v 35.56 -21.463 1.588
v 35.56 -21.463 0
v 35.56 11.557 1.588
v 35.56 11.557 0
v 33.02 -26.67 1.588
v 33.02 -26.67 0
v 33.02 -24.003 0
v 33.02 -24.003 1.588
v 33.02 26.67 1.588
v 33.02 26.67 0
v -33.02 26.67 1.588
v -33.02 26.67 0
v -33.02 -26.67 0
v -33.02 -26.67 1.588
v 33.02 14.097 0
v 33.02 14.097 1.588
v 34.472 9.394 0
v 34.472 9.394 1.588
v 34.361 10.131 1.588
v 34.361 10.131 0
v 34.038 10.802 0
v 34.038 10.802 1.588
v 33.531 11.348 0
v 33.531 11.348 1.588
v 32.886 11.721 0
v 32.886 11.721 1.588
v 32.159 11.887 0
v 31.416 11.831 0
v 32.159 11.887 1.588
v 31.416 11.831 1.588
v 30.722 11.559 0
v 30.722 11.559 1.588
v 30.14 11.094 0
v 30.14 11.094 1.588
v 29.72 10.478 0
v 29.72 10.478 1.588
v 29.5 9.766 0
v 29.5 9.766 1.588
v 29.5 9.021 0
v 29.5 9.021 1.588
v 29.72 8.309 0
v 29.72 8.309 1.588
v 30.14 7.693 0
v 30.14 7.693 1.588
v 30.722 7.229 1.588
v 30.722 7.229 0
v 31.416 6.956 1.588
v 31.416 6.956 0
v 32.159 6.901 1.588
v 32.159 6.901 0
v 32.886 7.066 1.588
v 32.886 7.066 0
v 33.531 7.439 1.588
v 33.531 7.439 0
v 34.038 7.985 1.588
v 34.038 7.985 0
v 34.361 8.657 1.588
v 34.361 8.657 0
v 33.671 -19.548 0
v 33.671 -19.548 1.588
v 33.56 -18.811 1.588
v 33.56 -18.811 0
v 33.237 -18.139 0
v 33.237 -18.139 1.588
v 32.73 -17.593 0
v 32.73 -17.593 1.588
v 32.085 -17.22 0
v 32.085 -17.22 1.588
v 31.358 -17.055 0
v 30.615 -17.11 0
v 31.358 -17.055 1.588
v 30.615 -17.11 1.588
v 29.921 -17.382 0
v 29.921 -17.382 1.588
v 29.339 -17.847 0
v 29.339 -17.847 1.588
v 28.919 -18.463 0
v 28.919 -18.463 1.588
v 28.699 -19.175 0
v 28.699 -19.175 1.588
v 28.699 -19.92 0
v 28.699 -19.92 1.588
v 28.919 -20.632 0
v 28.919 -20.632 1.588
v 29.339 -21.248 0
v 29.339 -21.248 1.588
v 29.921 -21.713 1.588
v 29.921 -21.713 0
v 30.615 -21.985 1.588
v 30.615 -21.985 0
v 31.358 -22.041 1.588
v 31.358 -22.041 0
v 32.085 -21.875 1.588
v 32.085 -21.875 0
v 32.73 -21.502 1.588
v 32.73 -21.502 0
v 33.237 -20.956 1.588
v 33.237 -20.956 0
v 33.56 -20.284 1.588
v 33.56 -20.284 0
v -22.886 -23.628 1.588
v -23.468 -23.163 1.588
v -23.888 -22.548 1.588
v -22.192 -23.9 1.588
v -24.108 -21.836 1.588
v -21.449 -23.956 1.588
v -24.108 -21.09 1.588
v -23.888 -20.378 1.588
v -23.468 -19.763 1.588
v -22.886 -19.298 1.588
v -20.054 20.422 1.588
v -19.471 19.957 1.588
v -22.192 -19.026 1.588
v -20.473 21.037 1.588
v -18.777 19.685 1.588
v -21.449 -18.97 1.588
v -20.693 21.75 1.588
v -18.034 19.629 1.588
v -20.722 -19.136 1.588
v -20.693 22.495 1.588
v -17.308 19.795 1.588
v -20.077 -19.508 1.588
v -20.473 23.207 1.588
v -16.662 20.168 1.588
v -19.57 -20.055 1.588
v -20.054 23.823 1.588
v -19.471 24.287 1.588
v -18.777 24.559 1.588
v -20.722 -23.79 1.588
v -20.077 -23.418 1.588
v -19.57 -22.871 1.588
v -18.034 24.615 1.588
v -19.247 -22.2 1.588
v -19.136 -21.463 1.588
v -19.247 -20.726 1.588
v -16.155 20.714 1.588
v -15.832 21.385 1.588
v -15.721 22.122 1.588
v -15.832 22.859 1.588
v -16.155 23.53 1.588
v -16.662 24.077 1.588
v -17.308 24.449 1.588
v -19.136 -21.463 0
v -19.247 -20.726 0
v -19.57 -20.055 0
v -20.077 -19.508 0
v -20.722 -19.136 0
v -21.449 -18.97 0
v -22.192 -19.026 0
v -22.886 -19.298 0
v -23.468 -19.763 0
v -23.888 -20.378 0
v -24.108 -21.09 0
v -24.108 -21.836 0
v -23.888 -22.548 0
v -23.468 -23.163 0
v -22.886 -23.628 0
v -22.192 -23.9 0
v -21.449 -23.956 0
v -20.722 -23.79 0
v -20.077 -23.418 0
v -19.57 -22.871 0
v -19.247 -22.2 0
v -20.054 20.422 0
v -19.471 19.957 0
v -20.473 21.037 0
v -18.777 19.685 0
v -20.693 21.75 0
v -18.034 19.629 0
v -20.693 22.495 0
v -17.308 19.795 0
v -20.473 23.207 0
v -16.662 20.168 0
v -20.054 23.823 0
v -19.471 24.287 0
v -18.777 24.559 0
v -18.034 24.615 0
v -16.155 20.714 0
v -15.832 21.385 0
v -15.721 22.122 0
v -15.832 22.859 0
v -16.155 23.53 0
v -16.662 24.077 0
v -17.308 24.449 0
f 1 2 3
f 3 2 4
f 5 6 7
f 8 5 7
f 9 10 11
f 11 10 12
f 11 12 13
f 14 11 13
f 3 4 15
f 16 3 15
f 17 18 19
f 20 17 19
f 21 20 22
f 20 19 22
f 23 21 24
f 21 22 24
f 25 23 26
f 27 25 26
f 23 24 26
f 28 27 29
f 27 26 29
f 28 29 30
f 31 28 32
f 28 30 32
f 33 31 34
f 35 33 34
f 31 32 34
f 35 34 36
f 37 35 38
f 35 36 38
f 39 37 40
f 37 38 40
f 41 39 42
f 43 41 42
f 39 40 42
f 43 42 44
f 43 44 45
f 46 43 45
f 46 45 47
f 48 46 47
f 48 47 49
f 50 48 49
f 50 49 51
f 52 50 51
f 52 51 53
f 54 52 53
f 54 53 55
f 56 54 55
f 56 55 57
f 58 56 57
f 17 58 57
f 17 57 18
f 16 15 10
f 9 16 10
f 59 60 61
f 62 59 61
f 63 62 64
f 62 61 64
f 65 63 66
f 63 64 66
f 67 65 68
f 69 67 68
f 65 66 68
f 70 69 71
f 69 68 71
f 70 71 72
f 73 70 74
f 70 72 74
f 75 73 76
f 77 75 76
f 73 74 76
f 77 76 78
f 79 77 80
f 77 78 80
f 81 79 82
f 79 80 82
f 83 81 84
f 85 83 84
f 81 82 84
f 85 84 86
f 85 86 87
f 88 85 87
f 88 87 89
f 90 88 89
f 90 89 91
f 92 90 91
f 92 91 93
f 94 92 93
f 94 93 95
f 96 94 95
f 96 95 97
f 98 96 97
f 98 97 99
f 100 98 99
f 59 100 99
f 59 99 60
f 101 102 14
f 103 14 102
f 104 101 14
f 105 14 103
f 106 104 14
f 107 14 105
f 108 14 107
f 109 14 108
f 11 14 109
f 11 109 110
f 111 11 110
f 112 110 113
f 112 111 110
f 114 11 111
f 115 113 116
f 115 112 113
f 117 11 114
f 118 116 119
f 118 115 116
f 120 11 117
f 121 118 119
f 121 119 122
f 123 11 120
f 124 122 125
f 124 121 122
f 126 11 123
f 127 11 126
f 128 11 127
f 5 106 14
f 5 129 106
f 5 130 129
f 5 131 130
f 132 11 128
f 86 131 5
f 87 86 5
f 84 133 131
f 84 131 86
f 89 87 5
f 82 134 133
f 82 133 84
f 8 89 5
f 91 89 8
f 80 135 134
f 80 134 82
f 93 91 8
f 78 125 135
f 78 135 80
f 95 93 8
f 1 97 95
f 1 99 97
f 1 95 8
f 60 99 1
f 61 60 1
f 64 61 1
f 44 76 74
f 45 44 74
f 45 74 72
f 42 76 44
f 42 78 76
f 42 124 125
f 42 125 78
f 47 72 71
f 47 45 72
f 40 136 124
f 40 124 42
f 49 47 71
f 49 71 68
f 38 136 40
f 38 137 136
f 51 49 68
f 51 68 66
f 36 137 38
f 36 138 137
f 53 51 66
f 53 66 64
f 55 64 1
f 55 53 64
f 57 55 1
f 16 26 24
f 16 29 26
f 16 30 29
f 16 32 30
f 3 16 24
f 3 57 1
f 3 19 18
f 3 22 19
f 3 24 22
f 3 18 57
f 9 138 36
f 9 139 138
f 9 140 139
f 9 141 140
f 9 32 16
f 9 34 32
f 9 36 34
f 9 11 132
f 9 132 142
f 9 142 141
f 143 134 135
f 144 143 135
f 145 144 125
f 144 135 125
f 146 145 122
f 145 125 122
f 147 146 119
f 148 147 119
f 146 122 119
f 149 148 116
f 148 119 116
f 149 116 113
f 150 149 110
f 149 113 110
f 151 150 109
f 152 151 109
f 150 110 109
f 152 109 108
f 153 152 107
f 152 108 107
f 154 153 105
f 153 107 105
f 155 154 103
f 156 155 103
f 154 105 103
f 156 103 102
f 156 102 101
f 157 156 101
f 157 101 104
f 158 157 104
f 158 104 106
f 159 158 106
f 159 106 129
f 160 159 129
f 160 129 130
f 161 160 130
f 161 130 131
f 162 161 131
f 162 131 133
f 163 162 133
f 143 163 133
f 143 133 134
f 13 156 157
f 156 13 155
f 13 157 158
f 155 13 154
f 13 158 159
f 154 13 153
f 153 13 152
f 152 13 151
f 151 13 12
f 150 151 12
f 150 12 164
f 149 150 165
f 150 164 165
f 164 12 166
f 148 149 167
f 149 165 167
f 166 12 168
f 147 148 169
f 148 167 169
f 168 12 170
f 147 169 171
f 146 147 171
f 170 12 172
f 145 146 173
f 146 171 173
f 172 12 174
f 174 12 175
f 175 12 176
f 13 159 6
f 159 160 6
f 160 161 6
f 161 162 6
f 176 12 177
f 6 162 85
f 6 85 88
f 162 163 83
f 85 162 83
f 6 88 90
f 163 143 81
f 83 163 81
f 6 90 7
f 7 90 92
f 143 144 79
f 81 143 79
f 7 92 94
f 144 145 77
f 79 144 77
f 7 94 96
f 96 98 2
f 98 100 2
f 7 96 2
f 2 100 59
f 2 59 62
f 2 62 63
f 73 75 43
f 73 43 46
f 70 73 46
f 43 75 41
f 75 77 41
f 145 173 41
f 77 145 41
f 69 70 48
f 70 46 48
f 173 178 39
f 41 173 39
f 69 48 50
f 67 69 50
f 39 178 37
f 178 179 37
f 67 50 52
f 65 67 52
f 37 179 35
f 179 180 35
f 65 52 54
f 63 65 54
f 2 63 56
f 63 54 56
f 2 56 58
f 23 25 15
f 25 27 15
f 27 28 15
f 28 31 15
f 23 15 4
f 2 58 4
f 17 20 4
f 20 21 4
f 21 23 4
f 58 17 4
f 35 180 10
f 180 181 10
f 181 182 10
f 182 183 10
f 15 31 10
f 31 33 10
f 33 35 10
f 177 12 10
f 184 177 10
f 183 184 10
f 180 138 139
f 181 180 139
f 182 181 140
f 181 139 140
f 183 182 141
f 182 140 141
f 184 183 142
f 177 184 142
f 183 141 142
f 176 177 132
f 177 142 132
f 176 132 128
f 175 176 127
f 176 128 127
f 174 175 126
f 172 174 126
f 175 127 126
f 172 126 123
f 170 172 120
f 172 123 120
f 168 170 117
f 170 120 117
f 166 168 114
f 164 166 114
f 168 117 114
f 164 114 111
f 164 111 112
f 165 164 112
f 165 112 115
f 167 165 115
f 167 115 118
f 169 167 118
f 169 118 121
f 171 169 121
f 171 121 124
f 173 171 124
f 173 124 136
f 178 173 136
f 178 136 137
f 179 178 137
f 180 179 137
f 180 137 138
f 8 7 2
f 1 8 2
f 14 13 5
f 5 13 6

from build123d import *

# Parameters (mm, degrees)
F1_DEPTH = 1.588
F2_R     = 2.5
F3_DEPTH = 1.589


with BuildPart() as f1:
    # F0 (on Top) → F1 (new body)
    with BuildSketch(Plane.XY):
        Polygon((33.02, 26.67), (-33.02, 26.67), (-33.02, -26.67), (33.02, -26.67), (33.02, -24.003), (33.02, 14.097), align=None)
        Polygon((35.56, 11.557), (33.02, 14.097), (33.02, -24.003), (35.56, -21.463), align=None)
    extrude(amount=F1_DEPTH)

    # F2 (on face) → F3 (cut, through all)
    with BuildSketch(Plane.XY.offset(1.588)):
        with Locations((-18.220948, 22.122128)):
            Circle(F2_R)
        with Locations((31.972159, 9.393649)):
            Circle(F2_R)
        with Locations((31.171337, -19.547544)):
            Circle(F2_R)
        with Locations((-21.635612, -21.463)):
            Circle(F2_R)
    extrude(amount=-F3_DEPTH, mode=Mode.SUBTRACT)


solid = f1.part
